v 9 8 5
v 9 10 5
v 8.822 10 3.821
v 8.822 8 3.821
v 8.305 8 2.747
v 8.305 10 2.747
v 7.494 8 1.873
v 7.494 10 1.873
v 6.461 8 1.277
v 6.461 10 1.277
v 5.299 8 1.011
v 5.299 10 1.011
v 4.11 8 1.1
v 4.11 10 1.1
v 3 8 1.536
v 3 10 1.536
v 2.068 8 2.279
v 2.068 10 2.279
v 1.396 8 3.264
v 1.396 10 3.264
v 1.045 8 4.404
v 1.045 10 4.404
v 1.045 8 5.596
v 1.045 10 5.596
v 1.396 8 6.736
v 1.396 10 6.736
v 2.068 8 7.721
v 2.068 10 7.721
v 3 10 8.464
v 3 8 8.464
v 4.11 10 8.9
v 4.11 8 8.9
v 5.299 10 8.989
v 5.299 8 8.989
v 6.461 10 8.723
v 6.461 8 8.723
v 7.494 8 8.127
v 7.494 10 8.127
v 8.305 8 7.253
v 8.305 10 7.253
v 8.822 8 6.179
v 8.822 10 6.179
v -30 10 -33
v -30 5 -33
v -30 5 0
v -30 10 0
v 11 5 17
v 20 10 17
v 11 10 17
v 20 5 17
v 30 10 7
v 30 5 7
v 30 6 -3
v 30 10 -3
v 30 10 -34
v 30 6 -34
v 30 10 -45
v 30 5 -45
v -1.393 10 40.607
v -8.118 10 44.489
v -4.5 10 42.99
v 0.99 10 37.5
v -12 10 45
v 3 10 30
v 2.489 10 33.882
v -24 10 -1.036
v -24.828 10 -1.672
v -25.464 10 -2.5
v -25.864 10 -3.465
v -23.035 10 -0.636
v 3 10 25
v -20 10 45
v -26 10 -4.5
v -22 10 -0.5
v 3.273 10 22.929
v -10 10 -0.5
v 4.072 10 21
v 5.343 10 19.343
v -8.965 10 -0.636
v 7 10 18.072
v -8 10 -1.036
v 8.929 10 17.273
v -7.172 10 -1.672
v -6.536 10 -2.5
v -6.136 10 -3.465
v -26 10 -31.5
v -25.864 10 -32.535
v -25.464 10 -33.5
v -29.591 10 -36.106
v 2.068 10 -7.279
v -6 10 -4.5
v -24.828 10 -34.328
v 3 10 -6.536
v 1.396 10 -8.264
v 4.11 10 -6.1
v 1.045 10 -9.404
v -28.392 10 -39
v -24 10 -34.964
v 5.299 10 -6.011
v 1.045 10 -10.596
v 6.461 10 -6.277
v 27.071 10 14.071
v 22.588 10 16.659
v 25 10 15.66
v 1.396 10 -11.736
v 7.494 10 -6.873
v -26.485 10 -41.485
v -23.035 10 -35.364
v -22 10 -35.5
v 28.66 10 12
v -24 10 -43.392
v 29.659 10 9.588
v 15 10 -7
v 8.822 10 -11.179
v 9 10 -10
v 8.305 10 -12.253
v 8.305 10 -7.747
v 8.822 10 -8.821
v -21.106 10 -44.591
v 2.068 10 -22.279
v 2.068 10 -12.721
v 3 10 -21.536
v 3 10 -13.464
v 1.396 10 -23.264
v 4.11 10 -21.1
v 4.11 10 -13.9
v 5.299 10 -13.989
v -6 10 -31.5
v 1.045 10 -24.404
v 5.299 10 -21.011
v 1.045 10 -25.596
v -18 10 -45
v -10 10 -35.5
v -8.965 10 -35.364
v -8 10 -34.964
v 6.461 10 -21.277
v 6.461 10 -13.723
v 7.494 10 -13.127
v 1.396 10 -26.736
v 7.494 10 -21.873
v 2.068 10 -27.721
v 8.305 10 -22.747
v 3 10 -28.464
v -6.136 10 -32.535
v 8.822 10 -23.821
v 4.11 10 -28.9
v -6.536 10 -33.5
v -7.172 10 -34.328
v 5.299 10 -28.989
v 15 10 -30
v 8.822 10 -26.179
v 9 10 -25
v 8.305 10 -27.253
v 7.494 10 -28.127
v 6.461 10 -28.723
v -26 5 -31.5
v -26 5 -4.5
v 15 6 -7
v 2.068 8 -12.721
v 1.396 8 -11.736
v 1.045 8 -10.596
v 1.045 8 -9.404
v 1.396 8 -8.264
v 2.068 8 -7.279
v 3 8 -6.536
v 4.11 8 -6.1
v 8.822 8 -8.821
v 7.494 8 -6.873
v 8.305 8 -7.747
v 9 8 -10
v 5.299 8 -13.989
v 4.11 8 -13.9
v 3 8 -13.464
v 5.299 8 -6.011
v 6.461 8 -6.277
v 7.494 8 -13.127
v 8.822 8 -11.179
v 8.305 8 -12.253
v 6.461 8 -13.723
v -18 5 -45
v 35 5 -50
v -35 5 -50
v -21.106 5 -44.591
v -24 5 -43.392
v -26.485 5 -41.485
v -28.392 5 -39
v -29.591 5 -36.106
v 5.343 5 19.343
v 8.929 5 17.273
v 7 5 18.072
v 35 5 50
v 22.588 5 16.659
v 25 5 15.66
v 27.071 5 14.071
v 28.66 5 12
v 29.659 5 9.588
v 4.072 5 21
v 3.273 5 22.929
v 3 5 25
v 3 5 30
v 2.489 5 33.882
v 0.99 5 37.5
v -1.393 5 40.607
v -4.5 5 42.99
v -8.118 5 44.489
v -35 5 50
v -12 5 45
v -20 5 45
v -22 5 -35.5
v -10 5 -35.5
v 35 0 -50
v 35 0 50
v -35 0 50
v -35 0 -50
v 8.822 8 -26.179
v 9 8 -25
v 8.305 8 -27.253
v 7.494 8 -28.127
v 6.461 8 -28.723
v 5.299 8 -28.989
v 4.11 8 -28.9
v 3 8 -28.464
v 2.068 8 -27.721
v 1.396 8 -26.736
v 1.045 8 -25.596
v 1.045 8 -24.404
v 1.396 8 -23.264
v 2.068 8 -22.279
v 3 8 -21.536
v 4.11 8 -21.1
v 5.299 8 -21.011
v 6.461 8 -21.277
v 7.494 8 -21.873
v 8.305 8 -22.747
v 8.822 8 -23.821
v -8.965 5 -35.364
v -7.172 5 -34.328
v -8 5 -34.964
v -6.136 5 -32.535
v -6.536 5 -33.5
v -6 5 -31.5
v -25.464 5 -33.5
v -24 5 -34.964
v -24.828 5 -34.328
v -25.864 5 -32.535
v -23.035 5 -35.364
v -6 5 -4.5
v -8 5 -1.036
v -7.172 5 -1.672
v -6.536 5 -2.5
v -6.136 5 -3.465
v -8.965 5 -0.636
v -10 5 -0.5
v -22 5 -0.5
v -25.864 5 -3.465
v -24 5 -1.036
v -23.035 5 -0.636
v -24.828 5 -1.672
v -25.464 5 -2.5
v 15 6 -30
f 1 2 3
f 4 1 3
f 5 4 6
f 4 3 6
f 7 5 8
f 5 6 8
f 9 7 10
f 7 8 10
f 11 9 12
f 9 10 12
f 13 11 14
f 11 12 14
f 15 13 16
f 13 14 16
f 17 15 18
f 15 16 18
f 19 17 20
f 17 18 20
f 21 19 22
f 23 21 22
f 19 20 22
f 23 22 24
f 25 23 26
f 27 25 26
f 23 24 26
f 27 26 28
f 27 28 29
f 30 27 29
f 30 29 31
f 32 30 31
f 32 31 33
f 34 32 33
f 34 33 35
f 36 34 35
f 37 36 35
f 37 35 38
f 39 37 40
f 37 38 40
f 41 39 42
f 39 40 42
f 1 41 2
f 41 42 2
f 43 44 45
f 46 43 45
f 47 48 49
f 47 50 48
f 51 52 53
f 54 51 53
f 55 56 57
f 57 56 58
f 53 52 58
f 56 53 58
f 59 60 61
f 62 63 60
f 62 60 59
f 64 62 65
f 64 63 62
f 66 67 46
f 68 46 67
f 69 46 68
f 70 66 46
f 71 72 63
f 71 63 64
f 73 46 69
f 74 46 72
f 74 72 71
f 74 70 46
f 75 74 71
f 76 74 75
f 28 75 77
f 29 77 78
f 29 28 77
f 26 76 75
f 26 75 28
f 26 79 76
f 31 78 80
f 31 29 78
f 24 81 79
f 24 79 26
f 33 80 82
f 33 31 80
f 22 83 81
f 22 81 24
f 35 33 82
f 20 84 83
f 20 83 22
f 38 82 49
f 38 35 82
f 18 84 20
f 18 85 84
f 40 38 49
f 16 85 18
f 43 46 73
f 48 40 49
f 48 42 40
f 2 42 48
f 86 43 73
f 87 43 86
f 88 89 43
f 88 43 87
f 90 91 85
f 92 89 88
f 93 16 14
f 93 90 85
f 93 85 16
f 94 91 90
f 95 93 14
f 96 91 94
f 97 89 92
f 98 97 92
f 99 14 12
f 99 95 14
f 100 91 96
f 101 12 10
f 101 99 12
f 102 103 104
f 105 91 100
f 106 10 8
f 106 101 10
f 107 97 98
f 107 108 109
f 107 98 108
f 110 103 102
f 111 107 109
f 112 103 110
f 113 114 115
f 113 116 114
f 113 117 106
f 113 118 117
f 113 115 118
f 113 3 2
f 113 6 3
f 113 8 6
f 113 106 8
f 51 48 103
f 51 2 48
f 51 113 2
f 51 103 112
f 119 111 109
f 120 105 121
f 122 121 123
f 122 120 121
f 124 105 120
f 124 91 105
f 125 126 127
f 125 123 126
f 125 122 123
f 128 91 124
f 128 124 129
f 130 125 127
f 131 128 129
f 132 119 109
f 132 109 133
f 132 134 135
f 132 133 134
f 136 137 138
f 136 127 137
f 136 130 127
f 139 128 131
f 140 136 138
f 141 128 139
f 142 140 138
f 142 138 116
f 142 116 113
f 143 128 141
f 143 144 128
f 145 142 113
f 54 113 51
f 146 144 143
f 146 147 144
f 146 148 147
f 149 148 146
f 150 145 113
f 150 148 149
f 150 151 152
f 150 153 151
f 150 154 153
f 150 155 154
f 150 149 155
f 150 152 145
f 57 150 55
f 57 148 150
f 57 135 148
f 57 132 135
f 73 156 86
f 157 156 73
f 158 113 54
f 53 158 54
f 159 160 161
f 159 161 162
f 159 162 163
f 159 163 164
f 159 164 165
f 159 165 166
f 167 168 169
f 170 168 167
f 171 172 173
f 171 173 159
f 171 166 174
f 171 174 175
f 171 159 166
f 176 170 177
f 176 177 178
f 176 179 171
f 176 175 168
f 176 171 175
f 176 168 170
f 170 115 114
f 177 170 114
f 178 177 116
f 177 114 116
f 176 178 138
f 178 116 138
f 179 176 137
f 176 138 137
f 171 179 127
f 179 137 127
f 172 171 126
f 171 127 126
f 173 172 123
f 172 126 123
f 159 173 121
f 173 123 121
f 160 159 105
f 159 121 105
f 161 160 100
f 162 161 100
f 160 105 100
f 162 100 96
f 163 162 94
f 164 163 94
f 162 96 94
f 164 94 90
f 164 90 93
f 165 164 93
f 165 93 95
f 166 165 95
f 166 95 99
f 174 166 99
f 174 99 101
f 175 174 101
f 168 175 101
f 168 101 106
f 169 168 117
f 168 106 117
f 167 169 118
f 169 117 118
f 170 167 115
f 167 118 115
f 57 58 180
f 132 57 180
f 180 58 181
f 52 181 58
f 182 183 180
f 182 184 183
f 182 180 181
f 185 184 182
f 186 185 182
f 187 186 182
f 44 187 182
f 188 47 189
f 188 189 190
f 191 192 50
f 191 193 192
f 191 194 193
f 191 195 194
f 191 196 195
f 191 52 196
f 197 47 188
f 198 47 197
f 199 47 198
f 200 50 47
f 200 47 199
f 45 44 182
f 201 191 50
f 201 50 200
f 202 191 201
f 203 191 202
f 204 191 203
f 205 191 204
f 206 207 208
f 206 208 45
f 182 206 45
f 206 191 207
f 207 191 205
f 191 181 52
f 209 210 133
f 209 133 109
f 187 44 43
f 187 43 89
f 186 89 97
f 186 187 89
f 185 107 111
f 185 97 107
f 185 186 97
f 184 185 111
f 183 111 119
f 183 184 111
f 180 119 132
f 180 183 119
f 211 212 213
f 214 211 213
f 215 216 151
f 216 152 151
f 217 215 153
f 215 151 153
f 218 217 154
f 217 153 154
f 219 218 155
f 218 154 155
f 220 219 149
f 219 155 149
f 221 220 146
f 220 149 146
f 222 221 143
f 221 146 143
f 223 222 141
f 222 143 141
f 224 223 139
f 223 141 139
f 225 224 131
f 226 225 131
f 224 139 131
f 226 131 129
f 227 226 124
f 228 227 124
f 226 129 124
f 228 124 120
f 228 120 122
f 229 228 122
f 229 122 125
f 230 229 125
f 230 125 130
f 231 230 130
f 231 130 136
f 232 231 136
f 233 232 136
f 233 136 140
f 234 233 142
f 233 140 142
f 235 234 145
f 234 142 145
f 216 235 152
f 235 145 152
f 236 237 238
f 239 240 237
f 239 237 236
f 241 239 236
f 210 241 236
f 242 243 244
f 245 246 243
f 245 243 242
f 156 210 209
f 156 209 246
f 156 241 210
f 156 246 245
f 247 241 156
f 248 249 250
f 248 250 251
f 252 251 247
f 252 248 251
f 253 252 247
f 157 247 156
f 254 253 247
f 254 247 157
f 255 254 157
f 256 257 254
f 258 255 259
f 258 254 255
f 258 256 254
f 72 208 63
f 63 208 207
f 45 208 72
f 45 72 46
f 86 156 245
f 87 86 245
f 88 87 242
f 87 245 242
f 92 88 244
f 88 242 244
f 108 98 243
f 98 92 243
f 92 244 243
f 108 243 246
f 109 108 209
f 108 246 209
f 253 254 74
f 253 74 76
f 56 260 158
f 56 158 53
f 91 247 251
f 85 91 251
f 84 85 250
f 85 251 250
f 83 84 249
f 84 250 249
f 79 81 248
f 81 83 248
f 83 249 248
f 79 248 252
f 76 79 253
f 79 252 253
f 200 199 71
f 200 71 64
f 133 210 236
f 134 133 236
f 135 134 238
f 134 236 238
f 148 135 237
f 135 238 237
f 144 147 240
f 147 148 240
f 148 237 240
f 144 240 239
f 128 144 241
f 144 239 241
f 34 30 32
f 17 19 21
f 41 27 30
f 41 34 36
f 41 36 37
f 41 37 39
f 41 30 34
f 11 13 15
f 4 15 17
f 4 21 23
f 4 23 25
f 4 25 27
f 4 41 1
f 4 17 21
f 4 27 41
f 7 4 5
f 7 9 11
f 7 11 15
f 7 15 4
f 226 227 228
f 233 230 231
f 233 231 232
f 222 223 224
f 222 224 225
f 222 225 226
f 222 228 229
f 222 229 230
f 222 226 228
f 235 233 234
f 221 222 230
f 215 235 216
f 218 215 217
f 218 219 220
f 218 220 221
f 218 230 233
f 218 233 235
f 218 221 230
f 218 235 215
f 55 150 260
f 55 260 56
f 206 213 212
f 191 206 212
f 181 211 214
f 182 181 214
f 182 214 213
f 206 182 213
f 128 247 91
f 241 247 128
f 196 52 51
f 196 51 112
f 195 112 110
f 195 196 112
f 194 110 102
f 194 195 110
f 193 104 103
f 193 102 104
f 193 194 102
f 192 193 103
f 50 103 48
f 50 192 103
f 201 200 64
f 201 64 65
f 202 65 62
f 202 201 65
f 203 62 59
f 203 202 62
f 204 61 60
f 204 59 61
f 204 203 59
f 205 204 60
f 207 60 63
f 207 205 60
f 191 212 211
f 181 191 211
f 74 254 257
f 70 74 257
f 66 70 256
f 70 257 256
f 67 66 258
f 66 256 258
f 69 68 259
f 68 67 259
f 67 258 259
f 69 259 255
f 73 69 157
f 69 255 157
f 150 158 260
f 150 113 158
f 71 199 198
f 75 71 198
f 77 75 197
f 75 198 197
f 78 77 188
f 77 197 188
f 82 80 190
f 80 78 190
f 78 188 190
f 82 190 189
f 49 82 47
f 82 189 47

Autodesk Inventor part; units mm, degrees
ref_plane "YZ Plane" through (0, 0, 0) normal (1, 0, 0) x (0, 1, 0)
ref_plane "XZ Plane" through (0, 0, 0) normal (0, 1, 0) x (-1, 0, 0)
ref_plane "XY Plane" through (0, 0, 0) normal (0, 0, 1) x (1, 0, 0)
sketch "Sketch1" plane through (0, 0, 0) normal (0, 1, 0) x (-1, 0, 0)
  line L0 (35, 50) -> (-35, 50)
  line L1 (-35, 50) -> (-35, -50)
  line L2 (-35, -50) -> (35, -50)
  line L3 (35, -50) -> (35, 50)
  line L4 (35, 50) -> (-35, -50) construction
  line L5 (-35, 50) -> (35, -50) construction
  point P0 (0, 0)
  dimension "d0" = 70
  dimension "d1" = 100
extrude "Extrusion1" add sketch "Sketch1" along normal blind 5
sketch "Sketch2" plane through (0, 5, 0) normal (0, 1, 0) x (1, 0, 0)
  line L0 (-20, -45) -> (-12, -45)
  line L1 (30, -7) -> (30, 45)
  line L2 (30, 45) -> (-18, 45)
  line L3 (-30, 33) -> (-30, 0)
  line L4 (-30, -45) -> (30, 45) construction
  line L5 (30, -45) -> (-30, 45) construction
  line L6 (-20, -45) -> (-30, 0)
  line L7 (-35, -50) -> (35, -50) projected
  line L8 (35, -50) -> (35, 50) projected
  line L9 (3, -25) -> (3, -30)
  line L10 (20, -17) -> (11, -17)
  arc A0 (11, -17) -> (3, -25) centre (11, -25) ccw
  arc A1 (20, -17) -> (30, -7) centre (20, -7) ccw
  arc A2 (-18, 45) -> (-30, 33) centre (-18, 33) ccw
  line L11 (-22, 0.5) -> (-10, 0.5)
  line L12 (-6, 4.5) -> (-6, 31.5)
  line L13 (-10, 35.5) -> (-22, 35.5)
  line L14 (-26, 31.5) -> (-26, 4.5)
  line L15 (-26, 0.5) -> (-6, 35.5) construction
  line L16 (-6, 0.5) -> (-26, 35.5) construction
  arc A3 (-12, -45) -> (3, -30) centre (-12, -30) ccw
  arc A4 (-26, 4.5) -> (-22, 0.5) centre (-22, 4.5) ccw
  arc A5 (-22, 35.5) -> (-26, 31.5) centre (-22, 31.5) ccw
  arc A6 (-6, 31.5) -> (-10, 35.5) centre (-10, 31.5) ccw
  arc A7 (-10, 0.5) -> (-6, 4.5) centre (-10, 4.5) ccw
  point P0 (0, 0)
  point P1 (3, -45)
  point P2 (-16, 18)
  dimension "d4" = 60
  dimension "d5" = 90
  dimension "d6" = 50
  dimension "d7" = 55
  dimension "d8" = 32
  dimension "d10" = 8
  dimension "d11" = 10
  dimension "d12" = 12
  dimension "d22" = 20
  dimension "d23" = 35
  dimension "d24" = 68
  dimension "d25" = 51
  dimension "d26" = 15
  dimension "d39" = 4
extrude "Extrusion2" add sketch "Sketch2" along normal blind 5
sketch "Sketch3" plane through (0, 10, 0) normal (0, 1, 0) x (1, 0, 0)
  line L0 (15, 7) -> (15, 30)
  line L1 (15, 30) -> (30, 34)
  line L2 (30, -7) -> (30, 45) projected
  line L3 (15, 7) -> (30, 3)
  line L4 (-35, -50) -> (35, -50) projected
  line L5 (30, 3) -> (30, 34)
  point P0 (0, 0)
  dimension "d15" = 23
  dimension "d16" = 15
  dimension "d17" = 53
  dimension "d18" = 57
  dimension "d19" = 84
extrude "Extrusion3" cut sketch "Sketch3" against normal blind 4
sketch "Sketch4" plane through (0, 10, 0) normal (0, 1, 0) x (1, 0, 0)
  circle A0 centre (5, -5) radius 4
  line L0 (-35, -50) -> (35, -50) projected
  line L1 (35, -50) -> (35, 50) projected
  circle A1 centre (5, 10) radius 4
  circle A2 centre (5, 25) radius 4
  point P0 (0, 0)
  dimension "d27" = 8
  dimension "d28" = 45
  dimension "d29" = 30
  dimension "d32" = 15
extrude "Extrusion4" cut sketch "Sketch4" against normal blind 2
properties part number "A2P4"
